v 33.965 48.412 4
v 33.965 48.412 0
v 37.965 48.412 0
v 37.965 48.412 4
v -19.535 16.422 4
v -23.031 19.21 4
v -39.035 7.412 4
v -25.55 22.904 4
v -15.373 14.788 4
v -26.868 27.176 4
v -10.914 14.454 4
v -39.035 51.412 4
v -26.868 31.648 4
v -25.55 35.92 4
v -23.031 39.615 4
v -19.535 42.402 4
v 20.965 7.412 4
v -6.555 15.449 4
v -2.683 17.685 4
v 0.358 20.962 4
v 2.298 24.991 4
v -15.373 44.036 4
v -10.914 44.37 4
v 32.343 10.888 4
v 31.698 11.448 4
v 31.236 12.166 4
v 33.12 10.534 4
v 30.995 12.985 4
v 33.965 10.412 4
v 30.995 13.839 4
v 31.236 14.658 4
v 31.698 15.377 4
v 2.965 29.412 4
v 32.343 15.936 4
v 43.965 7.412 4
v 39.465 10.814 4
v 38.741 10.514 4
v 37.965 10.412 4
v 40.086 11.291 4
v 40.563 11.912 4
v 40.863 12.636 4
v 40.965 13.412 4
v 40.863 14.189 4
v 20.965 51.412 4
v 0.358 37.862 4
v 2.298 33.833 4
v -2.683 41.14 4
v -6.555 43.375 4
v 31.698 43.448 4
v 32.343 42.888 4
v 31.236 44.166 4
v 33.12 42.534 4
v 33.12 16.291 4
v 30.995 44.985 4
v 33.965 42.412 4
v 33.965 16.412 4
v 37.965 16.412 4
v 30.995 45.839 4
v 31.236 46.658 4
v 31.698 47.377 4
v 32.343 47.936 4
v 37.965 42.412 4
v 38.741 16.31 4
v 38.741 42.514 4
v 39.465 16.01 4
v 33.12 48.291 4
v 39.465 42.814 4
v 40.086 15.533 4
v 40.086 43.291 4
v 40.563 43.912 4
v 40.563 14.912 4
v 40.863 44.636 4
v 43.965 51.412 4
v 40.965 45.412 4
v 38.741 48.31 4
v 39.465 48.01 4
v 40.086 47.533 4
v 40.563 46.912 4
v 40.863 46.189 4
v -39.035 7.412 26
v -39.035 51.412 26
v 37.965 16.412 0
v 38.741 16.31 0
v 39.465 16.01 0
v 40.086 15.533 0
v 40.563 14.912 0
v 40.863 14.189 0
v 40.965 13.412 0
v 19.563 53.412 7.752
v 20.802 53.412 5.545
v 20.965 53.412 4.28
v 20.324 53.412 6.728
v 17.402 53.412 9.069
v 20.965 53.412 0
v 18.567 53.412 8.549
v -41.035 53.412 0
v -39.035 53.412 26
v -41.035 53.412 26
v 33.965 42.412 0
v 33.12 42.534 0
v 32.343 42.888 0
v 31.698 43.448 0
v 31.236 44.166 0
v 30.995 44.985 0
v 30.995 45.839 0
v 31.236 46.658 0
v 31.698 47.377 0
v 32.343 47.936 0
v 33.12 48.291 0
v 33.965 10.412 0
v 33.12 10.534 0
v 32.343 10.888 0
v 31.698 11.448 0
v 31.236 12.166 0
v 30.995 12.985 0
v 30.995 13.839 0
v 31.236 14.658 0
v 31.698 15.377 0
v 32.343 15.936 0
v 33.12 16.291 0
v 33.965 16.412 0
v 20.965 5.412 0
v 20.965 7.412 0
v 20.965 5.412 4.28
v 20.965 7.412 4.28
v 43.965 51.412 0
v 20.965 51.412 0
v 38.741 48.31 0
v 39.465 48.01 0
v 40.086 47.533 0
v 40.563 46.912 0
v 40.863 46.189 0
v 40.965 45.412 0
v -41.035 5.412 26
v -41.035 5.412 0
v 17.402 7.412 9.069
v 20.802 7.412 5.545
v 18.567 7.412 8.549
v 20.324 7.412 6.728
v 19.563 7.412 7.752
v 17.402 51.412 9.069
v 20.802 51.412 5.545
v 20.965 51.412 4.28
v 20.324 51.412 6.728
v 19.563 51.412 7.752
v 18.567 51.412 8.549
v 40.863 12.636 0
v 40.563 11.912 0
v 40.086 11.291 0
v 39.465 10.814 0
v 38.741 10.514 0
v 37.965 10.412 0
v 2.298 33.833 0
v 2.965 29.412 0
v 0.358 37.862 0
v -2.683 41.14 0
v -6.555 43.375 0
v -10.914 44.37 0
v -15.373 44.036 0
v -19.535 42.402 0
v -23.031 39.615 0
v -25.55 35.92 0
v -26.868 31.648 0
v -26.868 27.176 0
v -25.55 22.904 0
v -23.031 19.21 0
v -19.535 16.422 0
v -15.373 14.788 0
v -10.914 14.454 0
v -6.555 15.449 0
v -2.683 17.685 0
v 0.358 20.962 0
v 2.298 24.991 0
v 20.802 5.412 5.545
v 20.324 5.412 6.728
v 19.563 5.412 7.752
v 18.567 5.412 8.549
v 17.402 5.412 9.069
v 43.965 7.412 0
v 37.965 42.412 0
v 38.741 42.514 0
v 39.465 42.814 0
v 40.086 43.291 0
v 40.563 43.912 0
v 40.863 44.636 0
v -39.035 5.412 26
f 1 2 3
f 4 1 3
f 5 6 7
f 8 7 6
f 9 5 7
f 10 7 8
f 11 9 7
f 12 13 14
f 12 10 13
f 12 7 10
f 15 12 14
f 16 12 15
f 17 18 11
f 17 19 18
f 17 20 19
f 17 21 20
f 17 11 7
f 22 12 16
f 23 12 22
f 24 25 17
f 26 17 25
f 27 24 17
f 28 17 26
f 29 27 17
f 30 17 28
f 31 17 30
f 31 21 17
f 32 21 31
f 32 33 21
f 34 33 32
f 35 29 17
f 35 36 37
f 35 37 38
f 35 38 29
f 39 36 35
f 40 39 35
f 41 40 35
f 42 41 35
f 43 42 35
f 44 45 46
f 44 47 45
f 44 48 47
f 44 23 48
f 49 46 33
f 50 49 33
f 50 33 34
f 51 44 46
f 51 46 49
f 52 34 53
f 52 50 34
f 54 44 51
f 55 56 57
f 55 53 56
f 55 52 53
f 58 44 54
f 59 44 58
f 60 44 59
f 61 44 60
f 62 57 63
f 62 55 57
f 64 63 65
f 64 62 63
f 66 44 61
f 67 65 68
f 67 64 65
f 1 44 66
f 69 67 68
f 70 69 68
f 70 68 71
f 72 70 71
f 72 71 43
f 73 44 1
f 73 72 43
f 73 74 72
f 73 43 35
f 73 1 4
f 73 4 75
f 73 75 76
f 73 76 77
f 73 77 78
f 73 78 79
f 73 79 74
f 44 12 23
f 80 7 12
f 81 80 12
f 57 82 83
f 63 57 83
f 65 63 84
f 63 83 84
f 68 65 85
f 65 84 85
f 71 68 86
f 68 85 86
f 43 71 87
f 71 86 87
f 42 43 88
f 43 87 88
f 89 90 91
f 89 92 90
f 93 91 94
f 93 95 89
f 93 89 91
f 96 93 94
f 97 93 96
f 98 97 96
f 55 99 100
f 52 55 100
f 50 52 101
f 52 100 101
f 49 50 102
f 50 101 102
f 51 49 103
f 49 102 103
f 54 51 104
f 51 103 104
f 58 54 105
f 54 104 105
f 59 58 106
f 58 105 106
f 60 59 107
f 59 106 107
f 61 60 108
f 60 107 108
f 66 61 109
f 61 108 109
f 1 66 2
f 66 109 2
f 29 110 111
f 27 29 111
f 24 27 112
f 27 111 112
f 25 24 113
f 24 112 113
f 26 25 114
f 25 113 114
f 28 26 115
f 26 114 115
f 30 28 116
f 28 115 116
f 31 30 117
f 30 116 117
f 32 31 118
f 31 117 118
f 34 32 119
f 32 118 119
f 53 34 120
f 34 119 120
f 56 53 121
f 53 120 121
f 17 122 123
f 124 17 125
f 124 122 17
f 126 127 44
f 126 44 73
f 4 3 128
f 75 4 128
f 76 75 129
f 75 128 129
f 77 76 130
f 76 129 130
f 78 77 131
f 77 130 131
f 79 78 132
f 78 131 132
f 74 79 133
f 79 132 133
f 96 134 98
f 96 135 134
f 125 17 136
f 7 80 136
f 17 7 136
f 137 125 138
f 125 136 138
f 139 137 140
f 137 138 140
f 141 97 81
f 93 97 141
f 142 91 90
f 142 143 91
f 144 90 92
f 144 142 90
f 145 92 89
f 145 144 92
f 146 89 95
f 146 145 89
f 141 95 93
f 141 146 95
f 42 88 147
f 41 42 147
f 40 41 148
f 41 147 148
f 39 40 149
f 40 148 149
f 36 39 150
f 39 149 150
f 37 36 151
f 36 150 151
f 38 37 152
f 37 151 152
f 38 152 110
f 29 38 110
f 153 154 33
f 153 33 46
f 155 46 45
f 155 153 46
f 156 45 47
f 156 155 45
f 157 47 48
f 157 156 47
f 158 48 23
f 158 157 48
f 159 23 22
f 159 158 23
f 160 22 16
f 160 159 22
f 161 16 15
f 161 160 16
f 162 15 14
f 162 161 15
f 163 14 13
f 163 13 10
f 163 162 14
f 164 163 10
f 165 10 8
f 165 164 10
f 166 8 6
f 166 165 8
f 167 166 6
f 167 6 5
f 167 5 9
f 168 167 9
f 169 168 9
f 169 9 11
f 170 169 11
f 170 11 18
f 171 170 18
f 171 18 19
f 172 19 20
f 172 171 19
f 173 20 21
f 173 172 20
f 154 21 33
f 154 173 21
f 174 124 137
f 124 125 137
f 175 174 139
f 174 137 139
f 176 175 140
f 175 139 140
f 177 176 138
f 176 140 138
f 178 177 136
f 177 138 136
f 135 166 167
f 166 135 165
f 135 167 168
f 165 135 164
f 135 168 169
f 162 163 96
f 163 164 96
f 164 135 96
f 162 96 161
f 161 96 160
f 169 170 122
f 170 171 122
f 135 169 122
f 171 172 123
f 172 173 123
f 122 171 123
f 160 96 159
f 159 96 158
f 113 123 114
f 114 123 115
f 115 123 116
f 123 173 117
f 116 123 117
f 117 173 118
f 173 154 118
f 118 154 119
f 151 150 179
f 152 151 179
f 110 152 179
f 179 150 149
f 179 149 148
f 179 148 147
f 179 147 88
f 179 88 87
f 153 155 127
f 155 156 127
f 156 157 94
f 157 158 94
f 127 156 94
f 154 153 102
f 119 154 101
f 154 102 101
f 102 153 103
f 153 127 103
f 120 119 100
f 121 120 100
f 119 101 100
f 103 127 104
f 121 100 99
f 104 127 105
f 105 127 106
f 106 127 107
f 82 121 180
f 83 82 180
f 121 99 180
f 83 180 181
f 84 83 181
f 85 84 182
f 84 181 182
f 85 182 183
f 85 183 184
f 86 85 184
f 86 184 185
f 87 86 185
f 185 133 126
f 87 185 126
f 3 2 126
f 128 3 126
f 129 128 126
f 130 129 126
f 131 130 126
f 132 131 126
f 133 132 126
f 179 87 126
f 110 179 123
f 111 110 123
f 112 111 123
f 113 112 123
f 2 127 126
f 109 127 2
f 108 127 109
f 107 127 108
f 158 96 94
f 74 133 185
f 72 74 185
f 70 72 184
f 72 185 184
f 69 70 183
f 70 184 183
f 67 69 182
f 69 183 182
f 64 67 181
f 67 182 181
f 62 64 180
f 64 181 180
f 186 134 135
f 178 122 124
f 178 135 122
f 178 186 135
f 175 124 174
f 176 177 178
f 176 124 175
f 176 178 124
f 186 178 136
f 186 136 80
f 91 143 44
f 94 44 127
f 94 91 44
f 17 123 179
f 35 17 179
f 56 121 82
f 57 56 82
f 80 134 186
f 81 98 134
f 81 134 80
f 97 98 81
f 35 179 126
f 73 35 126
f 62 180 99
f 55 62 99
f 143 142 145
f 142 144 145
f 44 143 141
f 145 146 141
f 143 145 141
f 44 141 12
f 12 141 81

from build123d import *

# Parameters (mm, degrees)
F0_W      = 77
F0_H      = 44
F0_R      = 15
F1_DEPTH  = 4
F2_W      = 54
F2_H      = 2
F3_DEPTH  = 4
F4_W      = 2
F4_H      = 48
F5_DEPTH  = 4
F6_W      = 2
F6_H      = 48
F7_DEPTH  = 22
F9_DEPTH  = 2
F11_DEPTH = 2
F12_R     = 5
F13_R     = 5


with BuildPart() as f1:
    # F0 (on Top) → F1 (new body)
    with BuildSketch(Plane.XY):
        with Locations((5.464885, 29.412094)):
            Rectangle(F0_W, F0_H)
        with BuildLine():
            ThreePointArc((37.964885, 16.412094), (40.086206, 15.533415), (40.964885, 13.412094))
            ThreePointArc((40.964885, 13.412094), (40.086206, 11.290774), (37.964885, 10.412094))
            Line((37.964885, 10.412094), (33.964885, 10.412094))
            ThreePointArc((33.964885, 10.412094), (30.964885, 13.412094), (33.964885, 16.412094))
            Line((33.964885, 16.412094), (37.964885, 16.412094))
        make_face(mode=Mode.SUBTRACT)
        with Locations((-12.035115, 29.412094)):
            Circle(F0_R, mode=Mode.SUBTRACT)
        with BuildLine():
            ThreePointArc((37.964885, 48.412094), (40.086206, 47.533415), (40.964885, 45.412094))
            ThreePointArc((40.964885, 45.412094), (40.086206, 43.290774), (37.964885, 42.412094))
            Line((37.964885, 42.412094), (33.964885, 42.412094))
            ThreePointArc((33.964885, 42.412094), (30.964885, 45.412094), (33.964885, 48.412094))
            Line((33.964885, 48.412094), (37.964885, 48.412094))
        make_face(mode=Mode.SUBTRACT)
    extrude(amount=F1_DEPTH)



with BuildPart() as f3:
    # F2 (on face) → F3 (new body)
    with BuildSketch(Plane.XY.offset(4)):
        with Locations((-6.035115, 52.412094)):
            Rectangle(F2_W, F2_H)
        Polygon((-33.035115, 7.412094), (-33.035115, 51.412094), (-33.035115, 53.412094), (-39.035115, 53.412094), (-39.035115, 5.412094), (-33.035115, 5.412094), align=None)
        with Locations((-6.035115, 6.412094)):
            Rectangle(F2_W, F2_H)
    extrude(amount=-F3_DEPTH)

    # F4 (on face) → F5 (join)
    with BuildSketch(Plane.XY.offset(4)):
        with Locations((-40.035115, 29.412094)):
            Rectangle(F4_W, F4_H)
    extrude(amount=-F5_DEPTH)

    # F6 (on face) → F7 (join)
    with BuildSketch(Plane.XY.offset(4)):
        with Locations((-40.035115, 29.412094)):
            Rectangle(F6_W, F6_H)
    extrude(amount=F7_DEPTH)


with BuildPart() as f1_1:
    add(f1.part)

    add(f3.part)  # F9 merges F3
    # F8 (on face) → F9 (join)
    with BuildSketch(Plane.XZ.offset(-5.412094)):
        Polygon((-39.035115, 4), (20.964885, 4), (20.964885, 8), (-39.035115, 26), align=None)
    extrude(amount=-F9_DEPTH)

    # F10 (on face) → F11 (join)
    with BuildSketch(Plane(origin=(0, 53.412094, 0), x_dir=(-1, 0, 0), z_dir=(0, 1, 0))):
        Polygon((-20.964885, 8), (-20.964885, 4), (39.035115, 4), (39.035115, 26), align=None)
    extrude(amount=-F11_DEPTH)

    # F12
    f12_edges = [f1_1.edges().sort_by_distance(p)[0] for p in [
        (20.964885, 52.412094, 8),
    ]]
    fillet(f12_edges, radius=F12_R)

    # F13
    f13_edges = [f1_1.edges().sort_by_distance(p)[0] for p in [
        (20.964885, 6.412094, 8),
    ]]
    fillet(f13_edges, radius=F13_R)


solid = f1_1.part
